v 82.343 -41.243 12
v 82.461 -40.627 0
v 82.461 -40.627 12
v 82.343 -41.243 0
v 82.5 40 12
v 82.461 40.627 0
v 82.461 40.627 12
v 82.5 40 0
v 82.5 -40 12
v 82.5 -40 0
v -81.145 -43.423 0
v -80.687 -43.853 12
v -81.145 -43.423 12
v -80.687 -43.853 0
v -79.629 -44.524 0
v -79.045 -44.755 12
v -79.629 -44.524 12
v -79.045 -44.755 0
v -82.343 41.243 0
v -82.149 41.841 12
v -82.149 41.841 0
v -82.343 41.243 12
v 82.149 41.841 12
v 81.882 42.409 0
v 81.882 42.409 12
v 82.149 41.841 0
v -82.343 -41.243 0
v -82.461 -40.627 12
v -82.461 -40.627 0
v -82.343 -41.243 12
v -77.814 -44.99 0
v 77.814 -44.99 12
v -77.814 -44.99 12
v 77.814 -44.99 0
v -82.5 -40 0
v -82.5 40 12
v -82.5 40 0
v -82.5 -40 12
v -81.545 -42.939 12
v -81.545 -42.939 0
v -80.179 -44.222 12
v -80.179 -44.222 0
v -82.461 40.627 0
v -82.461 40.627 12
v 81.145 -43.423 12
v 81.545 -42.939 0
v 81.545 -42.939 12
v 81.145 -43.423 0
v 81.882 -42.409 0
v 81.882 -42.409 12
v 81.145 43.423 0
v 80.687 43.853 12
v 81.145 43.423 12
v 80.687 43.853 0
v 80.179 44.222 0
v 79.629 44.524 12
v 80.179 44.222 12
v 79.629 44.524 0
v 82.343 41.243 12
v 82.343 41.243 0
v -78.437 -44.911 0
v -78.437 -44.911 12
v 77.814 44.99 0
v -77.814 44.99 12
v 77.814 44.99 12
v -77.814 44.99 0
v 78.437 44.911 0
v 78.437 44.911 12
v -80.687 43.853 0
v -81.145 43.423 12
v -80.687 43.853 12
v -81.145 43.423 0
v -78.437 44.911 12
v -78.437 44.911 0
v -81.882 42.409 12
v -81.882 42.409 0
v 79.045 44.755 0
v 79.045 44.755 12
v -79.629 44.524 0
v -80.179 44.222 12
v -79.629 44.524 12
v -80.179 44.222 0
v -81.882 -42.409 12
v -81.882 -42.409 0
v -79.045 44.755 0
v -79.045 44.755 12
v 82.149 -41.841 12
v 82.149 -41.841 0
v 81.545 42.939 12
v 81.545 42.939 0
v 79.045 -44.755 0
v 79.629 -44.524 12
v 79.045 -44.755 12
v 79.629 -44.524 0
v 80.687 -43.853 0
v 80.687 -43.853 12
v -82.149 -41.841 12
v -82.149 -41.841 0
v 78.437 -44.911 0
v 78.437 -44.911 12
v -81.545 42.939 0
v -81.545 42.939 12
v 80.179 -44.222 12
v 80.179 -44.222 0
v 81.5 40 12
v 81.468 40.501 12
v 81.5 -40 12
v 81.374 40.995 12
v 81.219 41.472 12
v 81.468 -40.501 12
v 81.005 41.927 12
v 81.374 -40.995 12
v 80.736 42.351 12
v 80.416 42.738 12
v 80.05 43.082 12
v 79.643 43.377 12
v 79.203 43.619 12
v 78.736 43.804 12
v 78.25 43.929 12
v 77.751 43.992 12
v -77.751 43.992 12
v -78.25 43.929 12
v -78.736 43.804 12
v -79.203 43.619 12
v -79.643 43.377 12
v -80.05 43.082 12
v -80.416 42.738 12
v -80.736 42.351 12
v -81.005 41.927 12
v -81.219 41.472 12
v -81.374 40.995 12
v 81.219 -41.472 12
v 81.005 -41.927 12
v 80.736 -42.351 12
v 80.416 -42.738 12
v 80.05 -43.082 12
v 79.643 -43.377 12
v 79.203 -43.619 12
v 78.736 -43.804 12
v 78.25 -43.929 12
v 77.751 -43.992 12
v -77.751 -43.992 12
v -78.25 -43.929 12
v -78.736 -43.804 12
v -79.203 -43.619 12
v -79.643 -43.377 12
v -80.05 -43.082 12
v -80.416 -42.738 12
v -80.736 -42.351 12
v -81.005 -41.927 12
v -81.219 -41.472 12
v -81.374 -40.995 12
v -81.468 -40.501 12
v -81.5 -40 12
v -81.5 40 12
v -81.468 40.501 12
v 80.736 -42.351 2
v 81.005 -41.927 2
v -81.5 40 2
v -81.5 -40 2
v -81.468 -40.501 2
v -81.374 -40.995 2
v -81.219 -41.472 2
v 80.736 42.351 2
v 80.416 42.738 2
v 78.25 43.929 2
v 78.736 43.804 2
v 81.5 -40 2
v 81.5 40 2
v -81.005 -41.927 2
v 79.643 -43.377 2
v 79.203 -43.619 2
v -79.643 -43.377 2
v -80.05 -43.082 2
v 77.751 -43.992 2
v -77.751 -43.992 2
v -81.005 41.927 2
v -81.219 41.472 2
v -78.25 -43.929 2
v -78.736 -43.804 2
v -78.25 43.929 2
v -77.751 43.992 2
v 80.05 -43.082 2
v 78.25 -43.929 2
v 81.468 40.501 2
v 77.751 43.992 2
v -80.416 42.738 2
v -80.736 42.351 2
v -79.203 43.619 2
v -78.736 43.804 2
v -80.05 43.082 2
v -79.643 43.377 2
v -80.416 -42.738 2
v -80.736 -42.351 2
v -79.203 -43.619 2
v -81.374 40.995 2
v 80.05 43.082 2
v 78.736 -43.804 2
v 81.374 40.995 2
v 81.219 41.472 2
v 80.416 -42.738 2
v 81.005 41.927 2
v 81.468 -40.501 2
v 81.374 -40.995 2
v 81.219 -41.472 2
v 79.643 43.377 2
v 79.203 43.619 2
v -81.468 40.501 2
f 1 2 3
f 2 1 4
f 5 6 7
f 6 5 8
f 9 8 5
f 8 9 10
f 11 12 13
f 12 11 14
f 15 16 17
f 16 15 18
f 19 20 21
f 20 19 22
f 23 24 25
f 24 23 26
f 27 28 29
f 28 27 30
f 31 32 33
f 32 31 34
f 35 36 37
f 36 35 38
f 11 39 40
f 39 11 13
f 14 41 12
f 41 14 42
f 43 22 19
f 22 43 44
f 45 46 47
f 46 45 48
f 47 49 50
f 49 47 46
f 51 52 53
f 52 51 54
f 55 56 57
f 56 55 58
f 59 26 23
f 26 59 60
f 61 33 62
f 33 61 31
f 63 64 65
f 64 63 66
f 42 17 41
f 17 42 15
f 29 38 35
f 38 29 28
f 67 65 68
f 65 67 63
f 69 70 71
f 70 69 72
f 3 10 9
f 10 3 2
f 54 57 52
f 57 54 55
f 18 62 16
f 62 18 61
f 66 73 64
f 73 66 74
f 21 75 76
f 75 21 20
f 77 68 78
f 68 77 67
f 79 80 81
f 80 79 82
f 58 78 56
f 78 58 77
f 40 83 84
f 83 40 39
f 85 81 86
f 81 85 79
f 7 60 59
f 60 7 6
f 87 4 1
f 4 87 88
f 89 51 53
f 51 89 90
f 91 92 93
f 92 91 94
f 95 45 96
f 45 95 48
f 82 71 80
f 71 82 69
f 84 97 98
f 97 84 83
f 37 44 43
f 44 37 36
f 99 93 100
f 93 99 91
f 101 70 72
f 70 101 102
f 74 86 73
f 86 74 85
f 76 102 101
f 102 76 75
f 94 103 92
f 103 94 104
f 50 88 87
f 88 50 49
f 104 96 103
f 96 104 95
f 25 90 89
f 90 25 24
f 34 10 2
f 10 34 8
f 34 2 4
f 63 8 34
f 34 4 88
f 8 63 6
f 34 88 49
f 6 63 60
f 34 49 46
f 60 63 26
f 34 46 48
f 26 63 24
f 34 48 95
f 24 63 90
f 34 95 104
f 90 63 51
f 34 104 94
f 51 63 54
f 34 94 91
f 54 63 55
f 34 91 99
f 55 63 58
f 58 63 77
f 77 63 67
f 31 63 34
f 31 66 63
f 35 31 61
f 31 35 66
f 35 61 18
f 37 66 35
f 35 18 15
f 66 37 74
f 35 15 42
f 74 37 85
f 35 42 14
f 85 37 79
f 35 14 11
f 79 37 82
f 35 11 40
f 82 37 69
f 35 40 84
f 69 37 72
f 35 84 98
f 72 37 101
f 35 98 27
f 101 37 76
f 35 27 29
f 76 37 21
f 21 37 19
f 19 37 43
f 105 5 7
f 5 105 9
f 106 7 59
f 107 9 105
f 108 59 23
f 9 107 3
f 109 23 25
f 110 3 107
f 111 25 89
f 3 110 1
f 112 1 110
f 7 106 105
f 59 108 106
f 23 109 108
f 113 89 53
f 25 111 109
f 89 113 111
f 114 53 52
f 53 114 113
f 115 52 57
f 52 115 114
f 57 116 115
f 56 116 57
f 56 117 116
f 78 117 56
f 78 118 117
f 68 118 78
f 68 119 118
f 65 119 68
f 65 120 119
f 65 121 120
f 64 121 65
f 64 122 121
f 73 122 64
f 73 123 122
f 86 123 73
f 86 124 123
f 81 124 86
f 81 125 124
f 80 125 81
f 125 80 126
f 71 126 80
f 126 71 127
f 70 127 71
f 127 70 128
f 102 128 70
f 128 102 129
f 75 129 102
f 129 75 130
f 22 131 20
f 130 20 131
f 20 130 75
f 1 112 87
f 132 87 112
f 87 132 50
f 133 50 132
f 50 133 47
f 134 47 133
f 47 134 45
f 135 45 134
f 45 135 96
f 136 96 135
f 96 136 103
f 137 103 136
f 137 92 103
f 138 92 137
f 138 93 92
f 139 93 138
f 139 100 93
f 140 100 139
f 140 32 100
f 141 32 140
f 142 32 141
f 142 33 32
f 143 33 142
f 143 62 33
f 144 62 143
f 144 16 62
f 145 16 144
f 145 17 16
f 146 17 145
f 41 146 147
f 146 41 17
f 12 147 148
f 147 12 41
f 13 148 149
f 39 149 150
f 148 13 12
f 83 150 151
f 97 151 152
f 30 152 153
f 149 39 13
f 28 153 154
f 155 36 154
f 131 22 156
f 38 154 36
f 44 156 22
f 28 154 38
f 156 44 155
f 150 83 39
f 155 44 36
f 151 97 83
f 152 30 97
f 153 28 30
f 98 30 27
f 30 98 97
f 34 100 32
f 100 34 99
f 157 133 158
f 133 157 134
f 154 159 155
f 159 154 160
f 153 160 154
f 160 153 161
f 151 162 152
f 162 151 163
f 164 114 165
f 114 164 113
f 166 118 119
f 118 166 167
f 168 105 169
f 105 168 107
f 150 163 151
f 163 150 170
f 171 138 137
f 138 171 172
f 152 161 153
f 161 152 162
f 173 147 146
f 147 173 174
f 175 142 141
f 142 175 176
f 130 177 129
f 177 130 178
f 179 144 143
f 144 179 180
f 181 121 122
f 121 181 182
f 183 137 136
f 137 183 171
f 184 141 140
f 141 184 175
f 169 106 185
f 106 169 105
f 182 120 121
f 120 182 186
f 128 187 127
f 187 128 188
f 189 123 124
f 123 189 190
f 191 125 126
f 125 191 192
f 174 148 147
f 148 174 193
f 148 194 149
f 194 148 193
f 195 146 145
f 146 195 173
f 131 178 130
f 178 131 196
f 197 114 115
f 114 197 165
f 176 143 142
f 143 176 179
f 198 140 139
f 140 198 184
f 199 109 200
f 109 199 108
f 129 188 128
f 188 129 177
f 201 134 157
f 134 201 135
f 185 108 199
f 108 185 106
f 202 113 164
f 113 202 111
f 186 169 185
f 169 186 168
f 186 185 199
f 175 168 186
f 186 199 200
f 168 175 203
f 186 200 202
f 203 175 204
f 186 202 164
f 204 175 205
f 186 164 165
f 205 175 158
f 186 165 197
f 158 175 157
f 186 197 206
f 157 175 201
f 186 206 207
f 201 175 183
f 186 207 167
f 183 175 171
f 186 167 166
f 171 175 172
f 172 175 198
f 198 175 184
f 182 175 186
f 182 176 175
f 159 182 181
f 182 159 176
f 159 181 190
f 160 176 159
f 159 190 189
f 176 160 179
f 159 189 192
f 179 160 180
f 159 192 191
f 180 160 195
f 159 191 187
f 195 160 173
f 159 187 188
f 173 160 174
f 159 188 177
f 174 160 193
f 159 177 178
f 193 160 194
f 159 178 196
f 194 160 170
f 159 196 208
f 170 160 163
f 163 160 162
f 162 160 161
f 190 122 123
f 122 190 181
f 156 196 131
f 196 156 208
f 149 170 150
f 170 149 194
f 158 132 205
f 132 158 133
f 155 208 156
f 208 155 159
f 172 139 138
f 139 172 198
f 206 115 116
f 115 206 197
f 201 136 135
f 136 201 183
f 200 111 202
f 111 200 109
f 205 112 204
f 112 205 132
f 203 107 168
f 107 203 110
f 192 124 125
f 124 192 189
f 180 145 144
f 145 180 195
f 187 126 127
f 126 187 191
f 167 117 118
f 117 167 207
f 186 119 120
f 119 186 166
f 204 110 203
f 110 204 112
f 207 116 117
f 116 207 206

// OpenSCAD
$fn = 50;


difference() {
	union() {
		hull() {
			translate(v = [-77.5000000000, 40.0000000000, 0]) {
				cylinder(h = 12, r = 5);
			}
			translate(v = [77.5000000000, 40.0000000000, 0]) {
				cylinder(h = 12, r = 5);
			}
			translate(v = [-77.5000000000, -40.0000000000, 0]) {
				cylinder(h = 12, r = 5);
			}
			translate(v = [77.5000000000, -40.0000000000, 0]) {
				cylinder(h = 12, r = 5);
			}
		}
	}
	union() {
		translate(v = [0, 0, 2]) {
			hull() {
				translate(v = [-77.5000000000, 40.0000000000, 0]) {
					cylinder(h = 10, r = 4);
				}
				translate(v = [77.5000000000, 40.0000000000, 0]) {
					cylinder(h = 10, r = 4);
				}
				translate(v = [-77.5000000000, -40.0000000000, 0]) {
					cylinder(h = 10, r = 4);
				}
				translate(v = [77.5000000000, -40.0000000000, 0]) {
					cylinder(h = 10, r = 4);
				}
			}
		}
	}
}
